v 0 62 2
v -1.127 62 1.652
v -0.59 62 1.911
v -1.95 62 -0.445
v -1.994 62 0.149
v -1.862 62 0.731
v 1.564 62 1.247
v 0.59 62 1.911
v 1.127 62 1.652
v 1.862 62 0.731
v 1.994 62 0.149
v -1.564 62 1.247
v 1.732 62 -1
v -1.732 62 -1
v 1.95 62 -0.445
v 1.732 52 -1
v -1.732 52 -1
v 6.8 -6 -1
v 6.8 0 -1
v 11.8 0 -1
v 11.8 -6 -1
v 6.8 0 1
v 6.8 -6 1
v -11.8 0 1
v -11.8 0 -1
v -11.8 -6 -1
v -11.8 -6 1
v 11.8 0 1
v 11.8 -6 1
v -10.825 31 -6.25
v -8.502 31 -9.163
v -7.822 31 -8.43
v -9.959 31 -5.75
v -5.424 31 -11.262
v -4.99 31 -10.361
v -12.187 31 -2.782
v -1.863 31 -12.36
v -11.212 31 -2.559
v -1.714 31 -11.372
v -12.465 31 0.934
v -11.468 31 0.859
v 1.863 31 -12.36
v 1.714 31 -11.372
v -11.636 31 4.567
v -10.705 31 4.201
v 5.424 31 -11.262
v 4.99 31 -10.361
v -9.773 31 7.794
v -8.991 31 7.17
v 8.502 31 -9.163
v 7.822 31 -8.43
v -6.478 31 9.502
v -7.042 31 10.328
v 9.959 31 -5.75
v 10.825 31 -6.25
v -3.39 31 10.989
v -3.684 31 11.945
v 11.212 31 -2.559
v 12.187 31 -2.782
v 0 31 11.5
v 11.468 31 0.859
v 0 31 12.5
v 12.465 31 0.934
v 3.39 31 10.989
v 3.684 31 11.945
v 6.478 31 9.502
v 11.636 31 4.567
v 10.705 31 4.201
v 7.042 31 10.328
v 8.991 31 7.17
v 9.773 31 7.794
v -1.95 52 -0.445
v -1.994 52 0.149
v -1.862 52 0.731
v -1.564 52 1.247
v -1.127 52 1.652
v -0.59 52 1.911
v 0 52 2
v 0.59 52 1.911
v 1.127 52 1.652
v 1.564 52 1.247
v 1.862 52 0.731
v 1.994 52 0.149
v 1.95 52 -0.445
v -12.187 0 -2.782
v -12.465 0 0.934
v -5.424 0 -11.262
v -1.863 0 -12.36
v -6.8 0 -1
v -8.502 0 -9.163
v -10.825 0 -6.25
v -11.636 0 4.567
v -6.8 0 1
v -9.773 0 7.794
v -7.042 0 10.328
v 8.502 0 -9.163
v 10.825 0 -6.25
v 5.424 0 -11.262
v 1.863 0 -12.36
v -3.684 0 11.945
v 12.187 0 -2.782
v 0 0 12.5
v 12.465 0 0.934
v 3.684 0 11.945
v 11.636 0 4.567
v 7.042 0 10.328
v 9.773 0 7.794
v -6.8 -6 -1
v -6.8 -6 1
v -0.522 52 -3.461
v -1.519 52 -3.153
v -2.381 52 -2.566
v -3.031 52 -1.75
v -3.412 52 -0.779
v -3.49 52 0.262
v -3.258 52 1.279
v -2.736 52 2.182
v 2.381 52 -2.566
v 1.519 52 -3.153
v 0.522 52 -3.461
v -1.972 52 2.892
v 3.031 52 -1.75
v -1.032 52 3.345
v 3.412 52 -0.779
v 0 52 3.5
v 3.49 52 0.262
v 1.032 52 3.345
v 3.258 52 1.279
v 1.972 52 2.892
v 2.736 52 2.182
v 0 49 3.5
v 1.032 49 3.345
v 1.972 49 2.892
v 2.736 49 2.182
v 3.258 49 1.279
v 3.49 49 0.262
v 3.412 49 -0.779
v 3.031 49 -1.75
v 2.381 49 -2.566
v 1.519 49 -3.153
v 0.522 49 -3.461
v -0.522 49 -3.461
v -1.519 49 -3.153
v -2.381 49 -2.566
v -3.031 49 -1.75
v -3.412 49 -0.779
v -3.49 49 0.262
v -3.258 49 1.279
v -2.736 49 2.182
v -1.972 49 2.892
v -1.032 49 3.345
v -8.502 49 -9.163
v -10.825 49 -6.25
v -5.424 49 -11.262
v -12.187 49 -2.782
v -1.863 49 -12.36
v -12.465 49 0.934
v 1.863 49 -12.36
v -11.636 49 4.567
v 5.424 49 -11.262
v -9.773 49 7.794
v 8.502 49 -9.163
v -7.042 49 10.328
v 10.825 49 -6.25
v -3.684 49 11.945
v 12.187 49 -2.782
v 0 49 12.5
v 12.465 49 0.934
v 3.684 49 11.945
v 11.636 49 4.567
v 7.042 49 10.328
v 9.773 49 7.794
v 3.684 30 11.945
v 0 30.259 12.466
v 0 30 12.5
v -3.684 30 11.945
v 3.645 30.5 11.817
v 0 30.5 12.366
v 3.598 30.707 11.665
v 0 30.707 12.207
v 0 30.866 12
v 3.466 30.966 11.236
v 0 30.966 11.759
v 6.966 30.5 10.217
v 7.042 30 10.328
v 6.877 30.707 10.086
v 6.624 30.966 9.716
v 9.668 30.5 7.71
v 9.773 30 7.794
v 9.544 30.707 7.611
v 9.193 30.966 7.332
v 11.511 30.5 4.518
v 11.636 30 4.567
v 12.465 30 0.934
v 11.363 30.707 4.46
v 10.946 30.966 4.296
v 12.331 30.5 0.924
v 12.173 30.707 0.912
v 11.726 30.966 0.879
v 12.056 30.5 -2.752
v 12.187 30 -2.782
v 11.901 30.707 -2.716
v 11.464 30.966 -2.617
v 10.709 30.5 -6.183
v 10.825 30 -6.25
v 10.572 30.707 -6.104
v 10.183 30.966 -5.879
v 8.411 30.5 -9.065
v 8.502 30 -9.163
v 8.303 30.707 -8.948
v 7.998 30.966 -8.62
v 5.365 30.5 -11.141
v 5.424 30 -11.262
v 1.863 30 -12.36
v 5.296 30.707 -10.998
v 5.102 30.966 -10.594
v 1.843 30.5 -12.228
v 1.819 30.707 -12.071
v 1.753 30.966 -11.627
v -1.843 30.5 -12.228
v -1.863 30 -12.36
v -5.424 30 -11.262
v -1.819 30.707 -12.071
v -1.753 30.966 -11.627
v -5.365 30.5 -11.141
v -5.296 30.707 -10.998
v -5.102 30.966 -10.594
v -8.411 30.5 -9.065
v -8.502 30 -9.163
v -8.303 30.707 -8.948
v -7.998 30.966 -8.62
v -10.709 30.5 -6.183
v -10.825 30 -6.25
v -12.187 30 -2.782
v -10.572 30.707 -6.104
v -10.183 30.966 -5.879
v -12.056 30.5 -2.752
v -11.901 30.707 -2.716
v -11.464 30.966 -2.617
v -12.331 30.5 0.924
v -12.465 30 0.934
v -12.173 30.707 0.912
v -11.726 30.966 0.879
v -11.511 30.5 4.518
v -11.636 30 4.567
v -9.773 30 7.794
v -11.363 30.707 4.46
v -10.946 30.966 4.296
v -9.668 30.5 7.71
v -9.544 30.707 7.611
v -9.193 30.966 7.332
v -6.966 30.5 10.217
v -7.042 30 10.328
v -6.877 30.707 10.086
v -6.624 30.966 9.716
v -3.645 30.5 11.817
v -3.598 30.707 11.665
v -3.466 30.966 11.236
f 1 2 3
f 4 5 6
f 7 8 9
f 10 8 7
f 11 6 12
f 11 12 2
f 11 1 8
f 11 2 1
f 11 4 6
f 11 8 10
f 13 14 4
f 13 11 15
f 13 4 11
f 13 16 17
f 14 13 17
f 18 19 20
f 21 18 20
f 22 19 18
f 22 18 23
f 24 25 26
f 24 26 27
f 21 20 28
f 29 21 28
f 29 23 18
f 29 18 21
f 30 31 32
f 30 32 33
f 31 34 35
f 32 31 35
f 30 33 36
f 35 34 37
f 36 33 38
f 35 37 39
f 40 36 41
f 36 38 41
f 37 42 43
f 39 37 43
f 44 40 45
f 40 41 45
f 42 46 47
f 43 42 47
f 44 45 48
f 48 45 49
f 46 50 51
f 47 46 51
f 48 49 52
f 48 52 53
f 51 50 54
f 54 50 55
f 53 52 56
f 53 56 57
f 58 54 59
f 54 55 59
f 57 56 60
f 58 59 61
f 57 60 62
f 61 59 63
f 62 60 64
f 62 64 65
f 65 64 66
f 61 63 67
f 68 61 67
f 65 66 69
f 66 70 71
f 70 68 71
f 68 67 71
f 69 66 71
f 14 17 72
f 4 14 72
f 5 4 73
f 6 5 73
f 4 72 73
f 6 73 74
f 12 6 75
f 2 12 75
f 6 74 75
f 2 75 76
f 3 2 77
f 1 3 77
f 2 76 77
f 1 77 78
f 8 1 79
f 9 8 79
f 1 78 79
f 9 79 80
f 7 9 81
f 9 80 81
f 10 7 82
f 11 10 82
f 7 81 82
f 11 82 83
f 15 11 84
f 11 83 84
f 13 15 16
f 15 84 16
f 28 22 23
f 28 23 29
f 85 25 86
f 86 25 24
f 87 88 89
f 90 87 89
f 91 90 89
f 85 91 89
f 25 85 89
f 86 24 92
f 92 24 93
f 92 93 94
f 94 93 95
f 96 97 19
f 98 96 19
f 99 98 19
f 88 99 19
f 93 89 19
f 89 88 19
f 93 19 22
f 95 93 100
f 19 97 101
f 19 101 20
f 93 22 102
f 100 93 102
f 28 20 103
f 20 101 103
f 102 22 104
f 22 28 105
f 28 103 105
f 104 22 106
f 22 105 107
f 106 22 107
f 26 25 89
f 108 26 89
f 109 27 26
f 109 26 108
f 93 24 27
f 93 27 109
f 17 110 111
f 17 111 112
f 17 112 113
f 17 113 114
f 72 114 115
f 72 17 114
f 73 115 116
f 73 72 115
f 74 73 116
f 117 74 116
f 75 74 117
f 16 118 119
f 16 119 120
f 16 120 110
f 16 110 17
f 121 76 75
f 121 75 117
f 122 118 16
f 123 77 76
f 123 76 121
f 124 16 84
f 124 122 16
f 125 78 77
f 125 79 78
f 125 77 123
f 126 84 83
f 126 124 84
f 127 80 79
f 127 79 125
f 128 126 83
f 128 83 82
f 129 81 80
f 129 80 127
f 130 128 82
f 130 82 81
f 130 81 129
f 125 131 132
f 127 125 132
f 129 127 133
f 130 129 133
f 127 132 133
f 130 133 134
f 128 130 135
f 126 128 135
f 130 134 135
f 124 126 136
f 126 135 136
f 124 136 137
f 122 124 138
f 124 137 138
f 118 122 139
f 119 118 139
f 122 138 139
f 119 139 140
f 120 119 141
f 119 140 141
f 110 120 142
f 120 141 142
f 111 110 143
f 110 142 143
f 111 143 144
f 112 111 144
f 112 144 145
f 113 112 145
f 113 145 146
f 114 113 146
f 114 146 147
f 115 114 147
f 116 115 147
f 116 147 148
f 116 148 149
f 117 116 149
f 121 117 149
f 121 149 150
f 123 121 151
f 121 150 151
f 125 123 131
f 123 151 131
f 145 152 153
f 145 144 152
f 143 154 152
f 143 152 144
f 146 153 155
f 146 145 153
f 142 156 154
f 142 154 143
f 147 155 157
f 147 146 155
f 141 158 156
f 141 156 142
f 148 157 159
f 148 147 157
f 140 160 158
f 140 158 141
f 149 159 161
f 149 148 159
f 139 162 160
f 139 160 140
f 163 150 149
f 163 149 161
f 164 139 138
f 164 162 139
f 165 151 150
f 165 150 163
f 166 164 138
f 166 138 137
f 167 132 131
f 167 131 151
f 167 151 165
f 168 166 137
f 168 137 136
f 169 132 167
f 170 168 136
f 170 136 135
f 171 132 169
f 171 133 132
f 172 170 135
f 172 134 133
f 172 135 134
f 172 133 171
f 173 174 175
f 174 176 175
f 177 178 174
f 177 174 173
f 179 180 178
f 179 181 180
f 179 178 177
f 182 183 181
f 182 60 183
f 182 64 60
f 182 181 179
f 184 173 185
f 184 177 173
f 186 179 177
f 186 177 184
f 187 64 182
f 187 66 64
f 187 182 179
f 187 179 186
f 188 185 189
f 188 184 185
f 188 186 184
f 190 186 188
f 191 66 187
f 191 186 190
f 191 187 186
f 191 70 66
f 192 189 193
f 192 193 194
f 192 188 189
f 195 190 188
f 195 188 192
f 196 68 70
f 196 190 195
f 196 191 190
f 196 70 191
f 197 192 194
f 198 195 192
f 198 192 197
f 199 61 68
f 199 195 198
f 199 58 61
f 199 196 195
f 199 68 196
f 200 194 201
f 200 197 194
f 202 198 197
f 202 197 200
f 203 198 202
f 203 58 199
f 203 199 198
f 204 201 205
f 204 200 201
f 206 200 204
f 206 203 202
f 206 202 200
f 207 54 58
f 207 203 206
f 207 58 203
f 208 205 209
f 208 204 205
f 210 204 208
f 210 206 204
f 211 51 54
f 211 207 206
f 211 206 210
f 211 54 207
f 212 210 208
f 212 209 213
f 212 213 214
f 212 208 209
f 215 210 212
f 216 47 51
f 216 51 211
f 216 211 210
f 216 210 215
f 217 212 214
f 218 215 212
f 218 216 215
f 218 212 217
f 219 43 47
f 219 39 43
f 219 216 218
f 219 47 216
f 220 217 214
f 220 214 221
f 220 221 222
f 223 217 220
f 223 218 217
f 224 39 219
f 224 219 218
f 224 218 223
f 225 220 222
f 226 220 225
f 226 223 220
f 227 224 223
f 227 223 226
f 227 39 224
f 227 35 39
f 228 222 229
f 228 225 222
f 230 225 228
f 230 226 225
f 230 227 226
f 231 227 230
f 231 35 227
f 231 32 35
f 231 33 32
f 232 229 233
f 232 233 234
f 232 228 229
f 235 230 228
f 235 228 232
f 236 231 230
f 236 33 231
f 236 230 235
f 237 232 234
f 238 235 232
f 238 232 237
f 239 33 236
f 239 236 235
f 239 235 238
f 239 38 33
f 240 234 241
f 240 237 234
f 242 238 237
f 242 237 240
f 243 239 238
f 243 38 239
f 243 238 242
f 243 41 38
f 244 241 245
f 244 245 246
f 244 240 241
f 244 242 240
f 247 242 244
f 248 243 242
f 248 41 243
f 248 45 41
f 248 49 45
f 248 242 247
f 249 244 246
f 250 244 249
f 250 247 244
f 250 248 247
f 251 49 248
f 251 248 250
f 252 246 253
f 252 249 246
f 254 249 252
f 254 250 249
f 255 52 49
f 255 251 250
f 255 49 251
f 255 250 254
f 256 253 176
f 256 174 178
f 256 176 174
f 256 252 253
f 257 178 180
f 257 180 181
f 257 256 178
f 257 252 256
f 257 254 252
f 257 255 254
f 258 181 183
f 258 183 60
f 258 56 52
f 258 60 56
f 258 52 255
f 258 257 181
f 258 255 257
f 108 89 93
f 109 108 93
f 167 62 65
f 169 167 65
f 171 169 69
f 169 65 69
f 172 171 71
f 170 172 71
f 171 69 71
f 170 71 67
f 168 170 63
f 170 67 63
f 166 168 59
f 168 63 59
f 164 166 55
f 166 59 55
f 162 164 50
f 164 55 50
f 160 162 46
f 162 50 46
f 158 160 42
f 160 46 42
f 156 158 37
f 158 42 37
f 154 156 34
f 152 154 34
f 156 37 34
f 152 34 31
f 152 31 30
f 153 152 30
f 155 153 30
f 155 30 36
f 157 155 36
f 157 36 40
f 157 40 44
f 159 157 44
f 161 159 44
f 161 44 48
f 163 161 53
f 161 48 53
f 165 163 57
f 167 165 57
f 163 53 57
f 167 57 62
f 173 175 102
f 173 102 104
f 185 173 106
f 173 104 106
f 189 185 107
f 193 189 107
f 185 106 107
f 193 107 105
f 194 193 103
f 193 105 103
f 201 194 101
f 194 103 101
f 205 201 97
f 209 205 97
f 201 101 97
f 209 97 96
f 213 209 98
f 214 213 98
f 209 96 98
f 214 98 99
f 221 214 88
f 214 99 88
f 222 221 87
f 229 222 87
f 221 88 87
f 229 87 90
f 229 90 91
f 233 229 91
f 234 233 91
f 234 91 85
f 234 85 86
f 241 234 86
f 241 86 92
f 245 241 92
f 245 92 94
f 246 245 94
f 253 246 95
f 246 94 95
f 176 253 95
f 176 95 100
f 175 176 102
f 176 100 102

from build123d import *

# Parameters (mm, degrees)
ESBO_O1_R                = 12.5
RESSALTO_EXTRUS_O1_DEPTH = 31
FILETE1_R                = 1
ESBO_O2_R                = 12.5
RESSALTO_EXTRUS_O2_DEPTH = 18
ESBO_O3_W                = 5
ESBO_O3_H                = 2
RESSALTO_EXTRUS_O3_DEPTH = 6
ESBO_O5_R                = 3.5
RESSALTO_EXTRUS_O4_DEPTH = 3
RESSALTO_EXTRUS_O5_DEPTH = 10


with BuildPart() as part:
    # Esboço1 → Ressalto-extrusão1 (new body)
    with BuildSketch(Plane(origin=(0, 0, 0), x_dir=(1, 0, 0), z_dir=(0, 1, 0))):
        with Locations(Location((0, 0, 0), (0, 0, 270))):
            Circle(ESBO_O1_R)
    extrude(amount=RESSALTO_EXTRUS_O1_DEPTH)

    # Filete1
    filete1_edges = [part.edges().sort_by_distance(p)[0] for p in [
        (0, 31, -12.5),
    ]]
    fillet(filete1_edges, radius=FILETE1_R)

    # Esboço2 → Ressalto-extrusão2 (add)
    with BuildSketch(Plane(origin=(0, 31, 0), x_dir=(1, 0, 0), z_dir=(0, 1, 0))):
        with Locations(Location((0, 0, 0), (0, 0, 270))):
            Circle(ESBO_O2_R)
    extrude(amount=RESSALTO_EXTRUS_O2_DEPTH)

    # Esboço3 → Ressalto-extrusão3 (add)
    with BuildSketch(Plane.XZ):
        with Locations((9.3, 0)):
            Rectangle(ESBO_O3_W, ESBO_O3_H)
        with Locations((-9.3, 0)):
            Rectangle(ESBO_O3_W, ESBO_O3_H)
    extrude(amount=RESSALTO_EXTRUS_O3_DEPTH)

    # Esboço5 → Ressalto-extrusão4 (add)
    with BuildSketch(Plane(origin=(0, 49, 0), x_dir=(1, 0, 0), z_dir=(0, 1, 0))):
        with Locations(Location((0, 0, 0), (0, 0, 270))):
            Circle(ESBO_O5_R)
    extrude(amount=RESSALTO_EXTRUS_O4_DEPTH)

    # Esboço6 → Ressalto-extrusão5 (add)
    with BuildSketch(Plane(origin=(0, 52, 0), x_dir=(1, 0, 0), z_dir=(0, 1, 0))):
        with BuildLine():
            ThreePointArc((-1.732050808, 1), (0, -2), (1.732050808, 1))
            Line((1.732050808, 1), (-1.732050808, 1))
        make_face()
    extrude(amount=RESSALTO_EXTRUS_O5_DEPTH)


solid = part.part
